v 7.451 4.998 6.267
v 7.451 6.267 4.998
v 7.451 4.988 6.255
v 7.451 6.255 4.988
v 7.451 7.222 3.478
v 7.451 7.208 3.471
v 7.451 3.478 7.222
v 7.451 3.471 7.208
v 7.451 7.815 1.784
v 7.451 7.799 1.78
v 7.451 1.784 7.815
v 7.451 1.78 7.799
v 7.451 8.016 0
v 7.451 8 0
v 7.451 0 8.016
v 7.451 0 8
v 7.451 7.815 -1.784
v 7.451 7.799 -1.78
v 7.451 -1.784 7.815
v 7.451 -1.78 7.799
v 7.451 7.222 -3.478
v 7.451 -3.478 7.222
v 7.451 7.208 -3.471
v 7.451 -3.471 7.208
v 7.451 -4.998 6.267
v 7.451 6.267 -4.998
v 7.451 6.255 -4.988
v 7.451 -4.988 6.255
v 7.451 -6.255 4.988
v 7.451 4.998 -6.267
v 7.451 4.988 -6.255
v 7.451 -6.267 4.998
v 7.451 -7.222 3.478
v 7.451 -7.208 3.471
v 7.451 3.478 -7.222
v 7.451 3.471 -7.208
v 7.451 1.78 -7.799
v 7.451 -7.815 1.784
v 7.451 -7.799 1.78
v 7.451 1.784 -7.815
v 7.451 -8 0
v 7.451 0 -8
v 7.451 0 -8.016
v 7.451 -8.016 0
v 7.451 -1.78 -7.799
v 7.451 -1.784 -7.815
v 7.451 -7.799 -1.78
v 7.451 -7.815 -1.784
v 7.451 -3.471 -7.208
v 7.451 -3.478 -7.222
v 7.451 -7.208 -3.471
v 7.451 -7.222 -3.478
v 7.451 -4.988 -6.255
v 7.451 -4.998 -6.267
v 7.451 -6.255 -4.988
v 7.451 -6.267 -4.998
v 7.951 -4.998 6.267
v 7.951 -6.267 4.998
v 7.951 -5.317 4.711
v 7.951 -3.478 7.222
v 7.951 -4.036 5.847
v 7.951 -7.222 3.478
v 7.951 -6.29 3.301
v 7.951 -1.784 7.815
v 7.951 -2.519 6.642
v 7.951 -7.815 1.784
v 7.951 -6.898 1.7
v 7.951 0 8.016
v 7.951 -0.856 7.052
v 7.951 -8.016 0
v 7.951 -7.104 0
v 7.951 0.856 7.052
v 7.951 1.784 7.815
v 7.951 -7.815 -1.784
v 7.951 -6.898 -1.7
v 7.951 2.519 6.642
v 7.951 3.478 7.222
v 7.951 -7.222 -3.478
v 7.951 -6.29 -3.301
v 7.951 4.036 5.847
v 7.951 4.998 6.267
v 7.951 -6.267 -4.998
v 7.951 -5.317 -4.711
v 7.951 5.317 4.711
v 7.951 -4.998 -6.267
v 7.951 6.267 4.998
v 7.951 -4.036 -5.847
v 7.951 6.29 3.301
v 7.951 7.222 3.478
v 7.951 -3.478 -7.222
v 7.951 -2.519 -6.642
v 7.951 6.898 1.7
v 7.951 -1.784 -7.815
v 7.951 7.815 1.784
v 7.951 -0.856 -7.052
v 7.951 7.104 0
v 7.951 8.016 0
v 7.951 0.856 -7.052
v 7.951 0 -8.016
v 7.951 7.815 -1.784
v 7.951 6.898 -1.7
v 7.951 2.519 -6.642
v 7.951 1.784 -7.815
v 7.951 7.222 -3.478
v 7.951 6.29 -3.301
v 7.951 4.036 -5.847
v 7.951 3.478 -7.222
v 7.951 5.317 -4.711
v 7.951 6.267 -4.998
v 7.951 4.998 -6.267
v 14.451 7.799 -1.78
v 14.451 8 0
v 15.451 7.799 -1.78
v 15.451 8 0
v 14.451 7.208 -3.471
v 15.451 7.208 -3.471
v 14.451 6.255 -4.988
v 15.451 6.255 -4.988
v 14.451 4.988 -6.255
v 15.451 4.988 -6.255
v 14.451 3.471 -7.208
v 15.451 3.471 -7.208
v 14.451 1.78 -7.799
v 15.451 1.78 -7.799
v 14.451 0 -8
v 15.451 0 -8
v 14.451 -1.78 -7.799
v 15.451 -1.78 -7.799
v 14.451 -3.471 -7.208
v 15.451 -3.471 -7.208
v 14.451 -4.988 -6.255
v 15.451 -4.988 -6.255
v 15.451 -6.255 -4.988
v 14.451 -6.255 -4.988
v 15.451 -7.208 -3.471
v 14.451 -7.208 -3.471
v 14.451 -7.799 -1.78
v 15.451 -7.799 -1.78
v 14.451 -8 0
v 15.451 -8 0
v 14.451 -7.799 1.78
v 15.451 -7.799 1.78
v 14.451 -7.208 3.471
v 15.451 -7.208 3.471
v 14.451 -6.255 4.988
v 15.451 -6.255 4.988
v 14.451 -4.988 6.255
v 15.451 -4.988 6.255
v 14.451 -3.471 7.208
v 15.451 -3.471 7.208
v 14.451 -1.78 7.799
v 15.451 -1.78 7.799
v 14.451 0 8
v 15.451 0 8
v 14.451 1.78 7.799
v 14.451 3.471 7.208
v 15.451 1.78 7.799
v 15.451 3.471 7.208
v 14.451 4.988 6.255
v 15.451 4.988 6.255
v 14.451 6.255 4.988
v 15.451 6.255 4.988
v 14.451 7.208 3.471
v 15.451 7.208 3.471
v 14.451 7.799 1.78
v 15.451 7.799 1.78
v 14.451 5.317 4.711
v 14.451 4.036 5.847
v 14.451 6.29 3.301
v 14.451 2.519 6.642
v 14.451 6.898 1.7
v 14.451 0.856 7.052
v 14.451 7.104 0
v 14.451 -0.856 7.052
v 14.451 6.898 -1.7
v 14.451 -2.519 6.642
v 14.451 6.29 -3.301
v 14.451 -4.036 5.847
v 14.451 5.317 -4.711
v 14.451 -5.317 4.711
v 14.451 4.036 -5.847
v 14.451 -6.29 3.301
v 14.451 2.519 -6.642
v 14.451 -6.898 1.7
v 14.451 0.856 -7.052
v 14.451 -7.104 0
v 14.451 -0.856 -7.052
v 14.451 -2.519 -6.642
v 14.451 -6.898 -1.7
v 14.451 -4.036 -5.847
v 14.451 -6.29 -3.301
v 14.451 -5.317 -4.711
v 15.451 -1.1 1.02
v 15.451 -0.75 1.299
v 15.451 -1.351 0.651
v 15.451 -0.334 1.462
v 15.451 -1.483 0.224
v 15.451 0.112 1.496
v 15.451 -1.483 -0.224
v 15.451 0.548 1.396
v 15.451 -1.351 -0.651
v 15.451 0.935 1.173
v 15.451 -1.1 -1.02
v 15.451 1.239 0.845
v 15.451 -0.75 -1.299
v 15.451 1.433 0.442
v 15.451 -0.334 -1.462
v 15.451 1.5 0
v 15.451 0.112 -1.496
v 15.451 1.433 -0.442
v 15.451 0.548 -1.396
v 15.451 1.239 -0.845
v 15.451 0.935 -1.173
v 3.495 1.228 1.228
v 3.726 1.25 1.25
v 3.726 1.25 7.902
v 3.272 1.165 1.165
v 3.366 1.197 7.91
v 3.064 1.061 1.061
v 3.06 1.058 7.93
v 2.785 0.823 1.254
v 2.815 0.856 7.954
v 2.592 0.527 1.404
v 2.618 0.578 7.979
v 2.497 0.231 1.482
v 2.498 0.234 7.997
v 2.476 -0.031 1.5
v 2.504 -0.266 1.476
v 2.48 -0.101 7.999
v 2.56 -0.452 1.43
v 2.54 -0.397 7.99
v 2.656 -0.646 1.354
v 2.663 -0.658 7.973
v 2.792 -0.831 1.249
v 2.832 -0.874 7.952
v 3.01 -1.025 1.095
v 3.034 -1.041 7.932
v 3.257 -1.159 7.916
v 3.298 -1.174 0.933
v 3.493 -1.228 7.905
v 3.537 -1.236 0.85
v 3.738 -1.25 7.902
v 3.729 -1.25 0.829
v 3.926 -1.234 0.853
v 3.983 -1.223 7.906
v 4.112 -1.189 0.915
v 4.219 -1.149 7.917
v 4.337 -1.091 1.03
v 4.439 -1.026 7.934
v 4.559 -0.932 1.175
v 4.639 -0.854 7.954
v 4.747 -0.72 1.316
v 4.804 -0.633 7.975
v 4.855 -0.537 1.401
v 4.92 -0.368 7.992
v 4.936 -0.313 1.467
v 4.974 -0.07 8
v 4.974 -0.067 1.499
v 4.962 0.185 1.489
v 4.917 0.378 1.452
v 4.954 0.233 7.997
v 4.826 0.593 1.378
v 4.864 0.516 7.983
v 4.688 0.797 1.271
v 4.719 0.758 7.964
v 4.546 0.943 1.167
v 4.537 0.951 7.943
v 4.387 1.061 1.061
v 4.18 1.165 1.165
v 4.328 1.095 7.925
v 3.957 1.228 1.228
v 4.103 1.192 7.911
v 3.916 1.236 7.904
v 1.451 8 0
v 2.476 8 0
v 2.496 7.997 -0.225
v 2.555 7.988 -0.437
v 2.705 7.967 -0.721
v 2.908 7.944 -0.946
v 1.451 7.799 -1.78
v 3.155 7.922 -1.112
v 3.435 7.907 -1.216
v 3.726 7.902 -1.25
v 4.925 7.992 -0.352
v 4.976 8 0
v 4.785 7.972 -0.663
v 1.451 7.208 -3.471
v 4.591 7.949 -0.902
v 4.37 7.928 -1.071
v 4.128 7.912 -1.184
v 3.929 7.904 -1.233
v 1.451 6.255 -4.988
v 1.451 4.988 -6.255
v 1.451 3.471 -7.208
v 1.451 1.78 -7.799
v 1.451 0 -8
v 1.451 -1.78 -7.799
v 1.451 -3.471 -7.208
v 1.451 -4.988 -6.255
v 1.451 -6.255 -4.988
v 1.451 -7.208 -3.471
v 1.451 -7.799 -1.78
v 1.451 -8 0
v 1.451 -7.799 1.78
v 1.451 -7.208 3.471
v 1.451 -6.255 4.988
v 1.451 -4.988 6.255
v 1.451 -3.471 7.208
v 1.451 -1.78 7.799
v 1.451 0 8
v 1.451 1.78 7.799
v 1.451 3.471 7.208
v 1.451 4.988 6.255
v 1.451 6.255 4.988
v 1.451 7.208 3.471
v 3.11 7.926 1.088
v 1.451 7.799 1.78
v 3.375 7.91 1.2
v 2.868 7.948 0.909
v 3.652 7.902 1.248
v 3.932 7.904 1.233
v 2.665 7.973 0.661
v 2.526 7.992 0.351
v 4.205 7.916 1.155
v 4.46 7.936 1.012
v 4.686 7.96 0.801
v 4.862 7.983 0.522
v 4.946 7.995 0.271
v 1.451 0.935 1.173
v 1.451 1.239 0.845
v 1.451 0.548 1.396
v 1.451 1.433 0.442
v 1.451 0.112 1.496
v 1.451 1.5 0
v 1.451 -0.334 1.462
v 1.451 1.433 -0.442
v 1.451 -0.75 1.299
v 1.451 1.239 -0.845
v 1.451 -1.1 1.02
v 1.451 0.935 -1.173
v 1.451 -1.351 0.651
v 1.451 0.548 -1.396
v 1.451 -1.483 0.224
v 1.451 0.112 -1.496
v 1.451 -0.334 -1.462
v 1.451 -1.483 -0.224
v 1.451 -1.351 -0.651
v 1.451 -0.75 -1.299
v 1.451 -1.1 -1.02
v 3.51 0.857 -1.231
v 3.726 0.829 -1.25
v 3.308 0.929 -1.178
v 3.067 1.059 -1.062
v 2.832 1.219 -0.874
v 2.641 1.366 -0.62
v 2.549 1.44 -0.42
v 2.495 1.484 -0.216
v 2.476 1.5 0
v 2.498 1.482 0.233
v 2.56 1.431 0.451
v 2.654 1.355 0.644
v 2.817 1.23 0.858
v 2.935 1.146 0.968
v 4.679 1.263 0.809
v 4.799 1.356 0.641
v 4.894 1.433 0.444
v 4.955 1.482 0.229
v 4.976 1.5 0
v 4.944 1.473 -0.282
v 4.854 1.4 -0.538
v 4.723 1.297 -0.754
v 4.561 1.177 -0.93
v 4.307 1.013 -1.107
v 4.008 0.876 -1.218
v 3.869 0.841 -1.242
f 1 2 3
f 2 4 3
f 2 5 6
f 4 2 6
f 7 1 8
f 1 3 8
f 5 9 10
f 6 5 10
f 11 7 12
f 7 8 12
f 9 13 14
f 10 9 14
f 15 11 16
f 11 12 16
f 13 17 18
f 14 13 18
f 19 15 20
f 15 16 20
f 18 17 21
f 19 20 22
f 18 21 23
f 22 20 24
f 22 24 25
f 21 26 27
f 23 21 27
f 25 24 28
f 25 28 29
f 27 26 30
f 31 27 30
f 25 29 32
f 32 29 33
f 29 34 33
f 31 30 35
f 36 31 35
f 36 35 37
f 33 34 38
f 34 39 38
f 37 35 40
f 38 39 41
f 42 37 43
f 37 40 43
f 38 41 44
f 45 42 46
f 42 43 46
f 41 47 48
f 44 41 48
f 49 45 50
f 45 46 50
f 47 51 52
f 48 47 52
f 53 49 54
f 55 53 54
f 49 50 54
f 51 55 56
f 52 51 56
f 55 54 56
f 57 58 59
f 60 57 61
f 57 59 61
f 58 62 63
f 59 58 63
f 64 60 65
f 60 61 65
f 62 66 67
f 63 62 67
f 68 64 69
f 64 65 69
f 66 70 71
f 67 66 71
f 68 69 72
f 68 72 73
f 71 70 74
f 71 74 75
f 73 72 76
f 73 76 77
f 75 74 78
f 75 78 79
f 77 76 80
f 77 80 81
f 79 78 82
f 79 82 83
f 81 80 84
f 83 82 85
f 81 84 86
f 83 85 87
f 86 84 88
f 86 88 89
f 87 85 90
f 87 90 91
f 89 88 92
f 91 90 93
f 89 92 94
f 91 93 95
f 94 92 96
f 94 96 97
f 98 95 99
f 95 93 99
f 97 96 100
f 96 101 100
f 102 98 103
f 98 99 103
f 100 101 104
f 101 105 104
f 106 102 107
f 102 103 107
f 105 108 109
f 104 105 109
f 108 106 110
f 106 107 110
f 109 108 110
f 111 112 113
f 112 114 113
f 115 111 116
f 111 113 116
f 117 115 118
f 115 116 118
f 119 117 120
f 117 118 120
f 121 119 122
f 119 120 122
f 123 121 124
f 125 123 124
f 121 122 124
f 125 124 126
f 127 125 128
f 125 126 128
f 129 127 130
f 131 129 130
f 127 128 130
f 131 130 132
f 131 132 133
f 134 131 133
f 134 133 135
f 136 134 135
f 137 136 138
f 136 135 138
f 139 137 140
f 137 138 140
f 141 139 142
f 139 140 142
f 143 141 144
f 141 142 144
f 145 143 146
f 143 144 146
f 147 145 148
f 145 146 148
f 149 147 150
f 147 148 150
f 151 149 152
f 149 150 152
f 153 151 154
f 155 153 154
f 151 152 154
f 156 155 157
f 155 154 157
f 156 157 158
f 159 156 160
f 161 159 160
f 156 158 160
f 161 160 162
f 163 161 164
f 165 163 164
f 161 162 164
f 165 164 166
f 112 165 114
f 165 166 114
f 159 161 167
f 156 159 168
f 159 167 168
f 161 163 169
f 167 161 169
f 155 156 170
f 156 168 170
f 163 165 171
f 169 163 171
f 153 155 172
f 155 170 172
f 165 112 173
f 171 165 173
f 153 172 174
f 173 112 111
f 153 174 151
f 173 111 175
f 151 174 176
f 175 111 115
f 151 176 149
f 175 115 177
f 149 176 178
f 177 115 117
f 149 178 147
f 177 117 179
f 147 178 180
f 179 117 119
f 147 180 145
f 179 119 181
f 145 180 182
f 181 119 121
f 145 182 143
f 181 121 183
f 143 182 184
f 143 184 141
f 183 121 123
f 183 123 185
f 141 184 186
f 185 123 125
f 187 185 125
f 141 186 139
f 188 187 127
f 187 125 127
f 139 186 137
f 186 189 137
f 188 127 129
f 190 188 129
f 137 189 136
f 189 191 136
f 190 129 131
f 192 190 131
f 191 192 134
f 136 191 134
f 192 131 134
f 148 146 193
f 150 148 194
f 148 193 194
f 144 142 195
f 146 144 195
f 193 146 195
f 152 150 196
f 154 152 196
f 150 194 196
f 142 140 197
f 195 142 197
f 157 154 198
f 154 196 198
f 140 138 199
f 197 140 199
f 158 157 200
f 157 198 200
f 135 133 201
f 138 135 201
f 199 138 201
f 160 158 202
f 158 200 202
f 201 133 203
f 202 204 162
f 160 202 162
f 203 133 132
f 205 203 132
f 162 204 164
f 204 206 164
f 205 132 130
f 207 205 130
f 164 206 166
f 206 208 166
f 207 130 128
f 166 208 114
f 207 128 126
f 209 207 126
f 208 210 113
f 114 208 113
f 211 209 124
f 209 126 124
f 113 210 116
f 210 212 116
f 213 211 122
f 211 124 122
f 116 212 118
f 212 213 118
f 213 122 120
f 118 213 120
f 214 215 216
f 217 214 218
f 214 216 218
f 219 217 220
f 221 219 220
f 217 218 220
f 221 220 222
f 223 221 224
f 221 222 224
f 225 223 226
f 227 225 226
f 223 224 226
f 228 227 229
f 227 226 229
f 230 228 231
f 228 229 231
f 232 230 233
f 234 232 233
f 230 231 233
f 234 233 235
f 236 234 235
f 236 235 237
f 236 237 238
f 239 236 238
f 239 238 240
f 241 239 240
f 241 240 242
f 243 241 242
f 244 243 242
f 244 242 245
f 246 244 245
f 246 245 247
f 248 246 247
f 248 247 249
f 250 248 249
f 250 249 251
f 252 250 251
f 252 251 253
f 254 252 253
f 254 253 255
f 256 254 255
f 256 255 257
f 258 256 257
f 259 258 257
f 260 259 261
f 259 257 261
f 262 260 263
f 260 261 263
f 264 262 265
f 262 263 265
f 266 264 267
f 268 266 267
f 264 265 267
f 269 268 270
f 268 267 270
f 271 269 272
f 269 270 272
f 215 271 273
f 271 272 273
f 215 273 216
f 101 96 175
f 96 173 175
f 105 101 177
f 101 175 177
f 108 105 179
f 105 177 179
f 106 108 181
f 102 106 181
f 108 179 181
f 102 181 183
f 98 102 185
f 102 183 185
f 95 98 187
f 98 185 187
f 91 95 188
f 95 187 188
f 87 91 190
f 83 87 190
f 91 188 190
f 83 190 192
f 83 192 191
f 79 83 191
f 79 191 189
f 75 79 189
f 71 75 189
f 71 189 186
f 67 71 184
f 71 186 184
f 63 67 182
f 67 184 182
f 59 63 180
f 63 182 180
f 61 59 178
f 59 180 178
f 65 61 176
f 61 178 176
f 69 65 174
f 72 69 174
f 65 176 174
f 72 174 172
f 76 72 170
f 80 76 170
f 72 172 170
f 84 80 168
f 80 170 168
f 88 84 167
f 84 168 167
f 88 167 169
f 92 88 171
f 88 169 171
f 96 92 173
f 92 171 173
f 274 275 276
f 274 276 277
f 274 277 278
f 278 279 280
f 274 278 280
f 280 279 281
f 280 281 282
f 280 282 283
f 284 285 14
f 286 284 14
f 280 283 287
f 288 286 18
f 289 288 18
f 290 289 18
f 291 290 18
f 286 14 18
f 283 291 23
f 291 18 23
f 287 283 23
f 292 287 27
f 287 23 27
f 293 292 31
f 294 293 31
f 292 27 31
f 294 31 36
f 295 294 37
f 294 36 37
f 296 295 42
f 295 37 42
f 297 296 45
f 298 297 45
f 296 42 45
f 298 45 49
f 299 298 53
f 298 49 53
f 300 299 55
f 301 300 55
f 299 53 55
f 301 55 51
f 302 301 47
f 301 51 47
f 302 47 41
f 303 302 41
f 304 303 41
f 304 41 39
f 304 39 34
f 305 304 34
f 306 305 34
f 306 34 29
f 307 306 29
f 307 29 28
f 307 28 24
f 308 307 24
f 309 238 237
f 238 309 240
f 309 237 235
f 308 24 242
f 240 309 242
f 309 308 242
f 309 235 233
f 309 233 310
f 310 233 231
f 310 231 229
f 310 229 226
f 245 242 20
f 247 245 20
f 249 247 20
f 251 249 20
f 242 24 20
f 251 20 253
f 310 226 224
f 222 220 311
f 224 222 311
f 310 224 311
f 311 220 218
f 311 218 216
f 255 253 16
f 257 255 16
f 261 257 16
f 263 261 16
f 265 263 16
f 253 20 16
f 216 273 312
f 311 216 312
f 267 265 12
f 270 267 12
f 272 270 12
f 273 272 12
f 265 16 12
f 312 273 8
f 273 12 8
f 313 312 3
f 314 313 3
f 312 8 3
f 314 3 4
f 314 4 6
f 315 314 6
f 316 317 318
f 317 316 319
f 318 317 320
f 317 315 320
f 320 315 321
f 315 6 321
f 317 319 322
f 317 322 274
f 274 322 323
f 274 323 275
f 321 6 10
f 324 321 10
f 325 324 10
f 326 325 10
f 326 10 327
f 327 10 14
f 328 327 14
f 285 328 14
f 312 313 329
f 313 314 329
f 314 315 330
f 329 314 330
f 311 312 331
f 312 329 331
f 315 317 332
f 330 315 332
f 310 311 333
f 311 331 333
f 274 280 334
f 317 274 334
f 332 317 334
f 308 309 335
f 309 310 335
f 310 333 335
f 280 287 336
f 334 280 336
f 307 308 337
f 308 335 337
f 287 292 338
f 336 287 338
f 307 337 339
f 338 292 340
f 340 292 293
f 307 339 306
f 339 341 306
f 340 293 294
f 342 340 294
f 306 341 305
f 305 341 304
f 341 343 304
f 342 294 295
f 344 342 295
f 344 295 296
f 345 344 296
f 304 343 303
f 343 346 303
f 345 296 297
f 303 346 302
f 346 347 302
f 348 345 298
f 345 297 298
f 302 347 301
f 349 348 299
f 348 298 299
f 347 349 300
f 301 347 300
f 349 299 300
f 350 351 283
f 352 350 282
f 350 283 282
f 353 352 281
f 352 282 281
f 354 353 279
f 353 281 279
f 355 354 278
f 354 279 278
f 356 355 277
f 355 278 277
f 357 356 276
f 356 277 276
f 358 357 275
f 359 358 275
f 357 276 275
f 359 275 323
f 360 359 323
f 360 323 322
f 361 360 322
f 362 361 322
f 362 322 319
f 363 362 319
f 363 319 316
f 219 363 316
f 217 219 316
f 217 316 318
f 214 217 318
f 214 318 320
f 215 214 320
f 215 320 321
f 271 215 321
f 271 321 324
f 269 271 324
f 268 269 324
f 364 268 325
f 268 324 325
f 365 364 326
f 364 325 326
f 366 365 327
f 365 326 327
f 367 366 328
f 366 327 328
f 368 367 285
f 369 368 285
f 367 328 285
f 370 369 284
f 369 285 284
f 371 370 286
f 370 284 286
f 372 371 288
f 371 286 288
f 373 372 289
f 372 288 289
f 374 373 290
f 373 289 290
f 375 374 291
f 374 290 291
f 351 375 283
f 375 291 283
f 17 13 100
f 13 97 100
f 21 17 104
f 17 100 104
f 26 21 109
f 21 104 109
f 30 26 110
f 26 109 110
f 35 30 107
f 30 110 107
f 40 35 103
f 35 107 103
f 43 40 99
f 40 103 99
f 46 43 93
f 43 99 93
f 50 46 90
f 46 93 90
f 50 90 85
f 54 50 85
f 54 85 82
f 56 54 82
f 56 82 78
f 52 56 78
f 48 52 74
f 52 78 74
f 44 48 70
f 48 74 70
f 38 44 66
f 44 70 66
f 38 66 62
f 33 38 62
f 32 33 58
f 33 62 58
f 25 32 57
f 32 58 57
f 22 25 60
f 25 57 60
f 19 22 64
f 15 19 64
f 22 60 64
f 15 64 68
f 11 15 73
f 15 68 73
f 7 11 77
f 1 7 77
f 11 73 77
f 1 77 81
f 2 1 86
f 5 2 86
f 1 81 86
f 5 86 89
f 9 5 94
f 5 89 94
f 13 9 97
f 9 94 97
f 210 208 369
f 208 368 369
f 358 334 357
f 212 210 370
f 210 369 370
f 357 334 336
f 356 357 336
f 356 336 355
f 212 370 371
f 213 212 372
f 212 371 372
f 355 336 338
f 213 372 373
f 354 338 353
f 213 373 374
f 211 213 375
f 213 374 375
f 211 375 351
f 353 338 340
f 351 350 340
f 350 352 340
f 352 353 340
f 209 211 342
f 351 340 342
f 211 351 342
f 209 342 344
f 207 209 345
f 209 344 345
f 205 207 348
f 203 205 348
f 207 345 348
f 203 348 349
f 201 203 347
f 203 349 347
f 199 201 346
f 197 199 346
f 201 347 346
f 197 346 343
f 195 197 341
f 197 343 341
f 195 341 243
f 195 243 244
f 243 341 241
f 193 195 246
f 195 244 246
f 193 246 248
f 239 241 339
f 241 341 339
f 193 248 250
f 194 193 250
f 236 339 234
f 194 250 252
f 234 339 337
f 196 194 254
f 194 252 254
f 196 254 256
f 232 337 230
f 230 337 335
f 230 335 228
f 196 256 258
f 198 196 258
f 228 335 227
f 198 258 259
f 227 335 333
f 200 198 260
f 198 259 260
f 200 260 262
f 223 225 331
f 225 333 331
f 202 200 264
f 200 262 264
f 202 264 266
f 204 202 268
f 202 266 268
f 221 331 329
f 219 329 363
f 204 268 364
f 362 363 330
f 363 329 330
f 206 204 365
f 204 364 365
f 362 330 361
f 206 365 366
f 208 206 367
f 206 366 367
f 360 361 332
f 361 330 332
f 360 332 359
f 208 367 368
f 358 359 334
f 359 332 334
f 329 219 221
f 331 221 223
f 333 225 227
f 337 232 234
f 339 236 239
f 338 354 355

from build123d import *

# Parameters (mm, degrees)
SKETCH2_W = 1.25
SKETCH2_H = 8.015739734
SKETCH4_W = 1.25
SKETCH4_H = 8.015739734


with BuildPart() as part:
    # Sketch1 → Revolve1 (revolve)
    with BuildSketch(Plane.XY):
        Polygon((1.451473536, 1.5), (1.451473536, 8), (7.451473536, 8), (7.451473536, 8.015739734), (7.951473536, 8.015739734), (7.951473536, 7.104033654), (14.451473536, 7.104033654), (14.451473536, 8), (15.451473536, 8), (15.451473536, 1.5), align=None)
    revolve(axis=Axis((0, 0, 0), (-1, 0, 0)))

    # Sketch2 → M3x0.5 Tapped Hole1 (revolve, cut)
    with BuildSketch(Plane(origin=(3.725736768, 0, 0), x_dir=(0, 0, -1), z_dir=(1, 0, 0))):
        with Locations((0.625, 4.007869867)):
            Rectangle(SKETCH2_W, SKETCH2_H)
    revolve(axis=Axis((3.725736768, -6.35, 0), (0, 1, 0)), mode=Mode.SUBTRACT)

    # Sketch4 → M3x0.5 Tapped Hole2 (revolve, cut)
    with BuildSketch(Plane.YZ.offset(3.725736768)):
        with Locations((0.625, 4.007869867)):
            Rectangle(SKETCH4_W, SKETCH4_H)
    revolve(axis=Axis((3.725736768, 0, -6.35), (0, 0, 1)), mode=Mode.SUBTRACT)


solid = part.part
